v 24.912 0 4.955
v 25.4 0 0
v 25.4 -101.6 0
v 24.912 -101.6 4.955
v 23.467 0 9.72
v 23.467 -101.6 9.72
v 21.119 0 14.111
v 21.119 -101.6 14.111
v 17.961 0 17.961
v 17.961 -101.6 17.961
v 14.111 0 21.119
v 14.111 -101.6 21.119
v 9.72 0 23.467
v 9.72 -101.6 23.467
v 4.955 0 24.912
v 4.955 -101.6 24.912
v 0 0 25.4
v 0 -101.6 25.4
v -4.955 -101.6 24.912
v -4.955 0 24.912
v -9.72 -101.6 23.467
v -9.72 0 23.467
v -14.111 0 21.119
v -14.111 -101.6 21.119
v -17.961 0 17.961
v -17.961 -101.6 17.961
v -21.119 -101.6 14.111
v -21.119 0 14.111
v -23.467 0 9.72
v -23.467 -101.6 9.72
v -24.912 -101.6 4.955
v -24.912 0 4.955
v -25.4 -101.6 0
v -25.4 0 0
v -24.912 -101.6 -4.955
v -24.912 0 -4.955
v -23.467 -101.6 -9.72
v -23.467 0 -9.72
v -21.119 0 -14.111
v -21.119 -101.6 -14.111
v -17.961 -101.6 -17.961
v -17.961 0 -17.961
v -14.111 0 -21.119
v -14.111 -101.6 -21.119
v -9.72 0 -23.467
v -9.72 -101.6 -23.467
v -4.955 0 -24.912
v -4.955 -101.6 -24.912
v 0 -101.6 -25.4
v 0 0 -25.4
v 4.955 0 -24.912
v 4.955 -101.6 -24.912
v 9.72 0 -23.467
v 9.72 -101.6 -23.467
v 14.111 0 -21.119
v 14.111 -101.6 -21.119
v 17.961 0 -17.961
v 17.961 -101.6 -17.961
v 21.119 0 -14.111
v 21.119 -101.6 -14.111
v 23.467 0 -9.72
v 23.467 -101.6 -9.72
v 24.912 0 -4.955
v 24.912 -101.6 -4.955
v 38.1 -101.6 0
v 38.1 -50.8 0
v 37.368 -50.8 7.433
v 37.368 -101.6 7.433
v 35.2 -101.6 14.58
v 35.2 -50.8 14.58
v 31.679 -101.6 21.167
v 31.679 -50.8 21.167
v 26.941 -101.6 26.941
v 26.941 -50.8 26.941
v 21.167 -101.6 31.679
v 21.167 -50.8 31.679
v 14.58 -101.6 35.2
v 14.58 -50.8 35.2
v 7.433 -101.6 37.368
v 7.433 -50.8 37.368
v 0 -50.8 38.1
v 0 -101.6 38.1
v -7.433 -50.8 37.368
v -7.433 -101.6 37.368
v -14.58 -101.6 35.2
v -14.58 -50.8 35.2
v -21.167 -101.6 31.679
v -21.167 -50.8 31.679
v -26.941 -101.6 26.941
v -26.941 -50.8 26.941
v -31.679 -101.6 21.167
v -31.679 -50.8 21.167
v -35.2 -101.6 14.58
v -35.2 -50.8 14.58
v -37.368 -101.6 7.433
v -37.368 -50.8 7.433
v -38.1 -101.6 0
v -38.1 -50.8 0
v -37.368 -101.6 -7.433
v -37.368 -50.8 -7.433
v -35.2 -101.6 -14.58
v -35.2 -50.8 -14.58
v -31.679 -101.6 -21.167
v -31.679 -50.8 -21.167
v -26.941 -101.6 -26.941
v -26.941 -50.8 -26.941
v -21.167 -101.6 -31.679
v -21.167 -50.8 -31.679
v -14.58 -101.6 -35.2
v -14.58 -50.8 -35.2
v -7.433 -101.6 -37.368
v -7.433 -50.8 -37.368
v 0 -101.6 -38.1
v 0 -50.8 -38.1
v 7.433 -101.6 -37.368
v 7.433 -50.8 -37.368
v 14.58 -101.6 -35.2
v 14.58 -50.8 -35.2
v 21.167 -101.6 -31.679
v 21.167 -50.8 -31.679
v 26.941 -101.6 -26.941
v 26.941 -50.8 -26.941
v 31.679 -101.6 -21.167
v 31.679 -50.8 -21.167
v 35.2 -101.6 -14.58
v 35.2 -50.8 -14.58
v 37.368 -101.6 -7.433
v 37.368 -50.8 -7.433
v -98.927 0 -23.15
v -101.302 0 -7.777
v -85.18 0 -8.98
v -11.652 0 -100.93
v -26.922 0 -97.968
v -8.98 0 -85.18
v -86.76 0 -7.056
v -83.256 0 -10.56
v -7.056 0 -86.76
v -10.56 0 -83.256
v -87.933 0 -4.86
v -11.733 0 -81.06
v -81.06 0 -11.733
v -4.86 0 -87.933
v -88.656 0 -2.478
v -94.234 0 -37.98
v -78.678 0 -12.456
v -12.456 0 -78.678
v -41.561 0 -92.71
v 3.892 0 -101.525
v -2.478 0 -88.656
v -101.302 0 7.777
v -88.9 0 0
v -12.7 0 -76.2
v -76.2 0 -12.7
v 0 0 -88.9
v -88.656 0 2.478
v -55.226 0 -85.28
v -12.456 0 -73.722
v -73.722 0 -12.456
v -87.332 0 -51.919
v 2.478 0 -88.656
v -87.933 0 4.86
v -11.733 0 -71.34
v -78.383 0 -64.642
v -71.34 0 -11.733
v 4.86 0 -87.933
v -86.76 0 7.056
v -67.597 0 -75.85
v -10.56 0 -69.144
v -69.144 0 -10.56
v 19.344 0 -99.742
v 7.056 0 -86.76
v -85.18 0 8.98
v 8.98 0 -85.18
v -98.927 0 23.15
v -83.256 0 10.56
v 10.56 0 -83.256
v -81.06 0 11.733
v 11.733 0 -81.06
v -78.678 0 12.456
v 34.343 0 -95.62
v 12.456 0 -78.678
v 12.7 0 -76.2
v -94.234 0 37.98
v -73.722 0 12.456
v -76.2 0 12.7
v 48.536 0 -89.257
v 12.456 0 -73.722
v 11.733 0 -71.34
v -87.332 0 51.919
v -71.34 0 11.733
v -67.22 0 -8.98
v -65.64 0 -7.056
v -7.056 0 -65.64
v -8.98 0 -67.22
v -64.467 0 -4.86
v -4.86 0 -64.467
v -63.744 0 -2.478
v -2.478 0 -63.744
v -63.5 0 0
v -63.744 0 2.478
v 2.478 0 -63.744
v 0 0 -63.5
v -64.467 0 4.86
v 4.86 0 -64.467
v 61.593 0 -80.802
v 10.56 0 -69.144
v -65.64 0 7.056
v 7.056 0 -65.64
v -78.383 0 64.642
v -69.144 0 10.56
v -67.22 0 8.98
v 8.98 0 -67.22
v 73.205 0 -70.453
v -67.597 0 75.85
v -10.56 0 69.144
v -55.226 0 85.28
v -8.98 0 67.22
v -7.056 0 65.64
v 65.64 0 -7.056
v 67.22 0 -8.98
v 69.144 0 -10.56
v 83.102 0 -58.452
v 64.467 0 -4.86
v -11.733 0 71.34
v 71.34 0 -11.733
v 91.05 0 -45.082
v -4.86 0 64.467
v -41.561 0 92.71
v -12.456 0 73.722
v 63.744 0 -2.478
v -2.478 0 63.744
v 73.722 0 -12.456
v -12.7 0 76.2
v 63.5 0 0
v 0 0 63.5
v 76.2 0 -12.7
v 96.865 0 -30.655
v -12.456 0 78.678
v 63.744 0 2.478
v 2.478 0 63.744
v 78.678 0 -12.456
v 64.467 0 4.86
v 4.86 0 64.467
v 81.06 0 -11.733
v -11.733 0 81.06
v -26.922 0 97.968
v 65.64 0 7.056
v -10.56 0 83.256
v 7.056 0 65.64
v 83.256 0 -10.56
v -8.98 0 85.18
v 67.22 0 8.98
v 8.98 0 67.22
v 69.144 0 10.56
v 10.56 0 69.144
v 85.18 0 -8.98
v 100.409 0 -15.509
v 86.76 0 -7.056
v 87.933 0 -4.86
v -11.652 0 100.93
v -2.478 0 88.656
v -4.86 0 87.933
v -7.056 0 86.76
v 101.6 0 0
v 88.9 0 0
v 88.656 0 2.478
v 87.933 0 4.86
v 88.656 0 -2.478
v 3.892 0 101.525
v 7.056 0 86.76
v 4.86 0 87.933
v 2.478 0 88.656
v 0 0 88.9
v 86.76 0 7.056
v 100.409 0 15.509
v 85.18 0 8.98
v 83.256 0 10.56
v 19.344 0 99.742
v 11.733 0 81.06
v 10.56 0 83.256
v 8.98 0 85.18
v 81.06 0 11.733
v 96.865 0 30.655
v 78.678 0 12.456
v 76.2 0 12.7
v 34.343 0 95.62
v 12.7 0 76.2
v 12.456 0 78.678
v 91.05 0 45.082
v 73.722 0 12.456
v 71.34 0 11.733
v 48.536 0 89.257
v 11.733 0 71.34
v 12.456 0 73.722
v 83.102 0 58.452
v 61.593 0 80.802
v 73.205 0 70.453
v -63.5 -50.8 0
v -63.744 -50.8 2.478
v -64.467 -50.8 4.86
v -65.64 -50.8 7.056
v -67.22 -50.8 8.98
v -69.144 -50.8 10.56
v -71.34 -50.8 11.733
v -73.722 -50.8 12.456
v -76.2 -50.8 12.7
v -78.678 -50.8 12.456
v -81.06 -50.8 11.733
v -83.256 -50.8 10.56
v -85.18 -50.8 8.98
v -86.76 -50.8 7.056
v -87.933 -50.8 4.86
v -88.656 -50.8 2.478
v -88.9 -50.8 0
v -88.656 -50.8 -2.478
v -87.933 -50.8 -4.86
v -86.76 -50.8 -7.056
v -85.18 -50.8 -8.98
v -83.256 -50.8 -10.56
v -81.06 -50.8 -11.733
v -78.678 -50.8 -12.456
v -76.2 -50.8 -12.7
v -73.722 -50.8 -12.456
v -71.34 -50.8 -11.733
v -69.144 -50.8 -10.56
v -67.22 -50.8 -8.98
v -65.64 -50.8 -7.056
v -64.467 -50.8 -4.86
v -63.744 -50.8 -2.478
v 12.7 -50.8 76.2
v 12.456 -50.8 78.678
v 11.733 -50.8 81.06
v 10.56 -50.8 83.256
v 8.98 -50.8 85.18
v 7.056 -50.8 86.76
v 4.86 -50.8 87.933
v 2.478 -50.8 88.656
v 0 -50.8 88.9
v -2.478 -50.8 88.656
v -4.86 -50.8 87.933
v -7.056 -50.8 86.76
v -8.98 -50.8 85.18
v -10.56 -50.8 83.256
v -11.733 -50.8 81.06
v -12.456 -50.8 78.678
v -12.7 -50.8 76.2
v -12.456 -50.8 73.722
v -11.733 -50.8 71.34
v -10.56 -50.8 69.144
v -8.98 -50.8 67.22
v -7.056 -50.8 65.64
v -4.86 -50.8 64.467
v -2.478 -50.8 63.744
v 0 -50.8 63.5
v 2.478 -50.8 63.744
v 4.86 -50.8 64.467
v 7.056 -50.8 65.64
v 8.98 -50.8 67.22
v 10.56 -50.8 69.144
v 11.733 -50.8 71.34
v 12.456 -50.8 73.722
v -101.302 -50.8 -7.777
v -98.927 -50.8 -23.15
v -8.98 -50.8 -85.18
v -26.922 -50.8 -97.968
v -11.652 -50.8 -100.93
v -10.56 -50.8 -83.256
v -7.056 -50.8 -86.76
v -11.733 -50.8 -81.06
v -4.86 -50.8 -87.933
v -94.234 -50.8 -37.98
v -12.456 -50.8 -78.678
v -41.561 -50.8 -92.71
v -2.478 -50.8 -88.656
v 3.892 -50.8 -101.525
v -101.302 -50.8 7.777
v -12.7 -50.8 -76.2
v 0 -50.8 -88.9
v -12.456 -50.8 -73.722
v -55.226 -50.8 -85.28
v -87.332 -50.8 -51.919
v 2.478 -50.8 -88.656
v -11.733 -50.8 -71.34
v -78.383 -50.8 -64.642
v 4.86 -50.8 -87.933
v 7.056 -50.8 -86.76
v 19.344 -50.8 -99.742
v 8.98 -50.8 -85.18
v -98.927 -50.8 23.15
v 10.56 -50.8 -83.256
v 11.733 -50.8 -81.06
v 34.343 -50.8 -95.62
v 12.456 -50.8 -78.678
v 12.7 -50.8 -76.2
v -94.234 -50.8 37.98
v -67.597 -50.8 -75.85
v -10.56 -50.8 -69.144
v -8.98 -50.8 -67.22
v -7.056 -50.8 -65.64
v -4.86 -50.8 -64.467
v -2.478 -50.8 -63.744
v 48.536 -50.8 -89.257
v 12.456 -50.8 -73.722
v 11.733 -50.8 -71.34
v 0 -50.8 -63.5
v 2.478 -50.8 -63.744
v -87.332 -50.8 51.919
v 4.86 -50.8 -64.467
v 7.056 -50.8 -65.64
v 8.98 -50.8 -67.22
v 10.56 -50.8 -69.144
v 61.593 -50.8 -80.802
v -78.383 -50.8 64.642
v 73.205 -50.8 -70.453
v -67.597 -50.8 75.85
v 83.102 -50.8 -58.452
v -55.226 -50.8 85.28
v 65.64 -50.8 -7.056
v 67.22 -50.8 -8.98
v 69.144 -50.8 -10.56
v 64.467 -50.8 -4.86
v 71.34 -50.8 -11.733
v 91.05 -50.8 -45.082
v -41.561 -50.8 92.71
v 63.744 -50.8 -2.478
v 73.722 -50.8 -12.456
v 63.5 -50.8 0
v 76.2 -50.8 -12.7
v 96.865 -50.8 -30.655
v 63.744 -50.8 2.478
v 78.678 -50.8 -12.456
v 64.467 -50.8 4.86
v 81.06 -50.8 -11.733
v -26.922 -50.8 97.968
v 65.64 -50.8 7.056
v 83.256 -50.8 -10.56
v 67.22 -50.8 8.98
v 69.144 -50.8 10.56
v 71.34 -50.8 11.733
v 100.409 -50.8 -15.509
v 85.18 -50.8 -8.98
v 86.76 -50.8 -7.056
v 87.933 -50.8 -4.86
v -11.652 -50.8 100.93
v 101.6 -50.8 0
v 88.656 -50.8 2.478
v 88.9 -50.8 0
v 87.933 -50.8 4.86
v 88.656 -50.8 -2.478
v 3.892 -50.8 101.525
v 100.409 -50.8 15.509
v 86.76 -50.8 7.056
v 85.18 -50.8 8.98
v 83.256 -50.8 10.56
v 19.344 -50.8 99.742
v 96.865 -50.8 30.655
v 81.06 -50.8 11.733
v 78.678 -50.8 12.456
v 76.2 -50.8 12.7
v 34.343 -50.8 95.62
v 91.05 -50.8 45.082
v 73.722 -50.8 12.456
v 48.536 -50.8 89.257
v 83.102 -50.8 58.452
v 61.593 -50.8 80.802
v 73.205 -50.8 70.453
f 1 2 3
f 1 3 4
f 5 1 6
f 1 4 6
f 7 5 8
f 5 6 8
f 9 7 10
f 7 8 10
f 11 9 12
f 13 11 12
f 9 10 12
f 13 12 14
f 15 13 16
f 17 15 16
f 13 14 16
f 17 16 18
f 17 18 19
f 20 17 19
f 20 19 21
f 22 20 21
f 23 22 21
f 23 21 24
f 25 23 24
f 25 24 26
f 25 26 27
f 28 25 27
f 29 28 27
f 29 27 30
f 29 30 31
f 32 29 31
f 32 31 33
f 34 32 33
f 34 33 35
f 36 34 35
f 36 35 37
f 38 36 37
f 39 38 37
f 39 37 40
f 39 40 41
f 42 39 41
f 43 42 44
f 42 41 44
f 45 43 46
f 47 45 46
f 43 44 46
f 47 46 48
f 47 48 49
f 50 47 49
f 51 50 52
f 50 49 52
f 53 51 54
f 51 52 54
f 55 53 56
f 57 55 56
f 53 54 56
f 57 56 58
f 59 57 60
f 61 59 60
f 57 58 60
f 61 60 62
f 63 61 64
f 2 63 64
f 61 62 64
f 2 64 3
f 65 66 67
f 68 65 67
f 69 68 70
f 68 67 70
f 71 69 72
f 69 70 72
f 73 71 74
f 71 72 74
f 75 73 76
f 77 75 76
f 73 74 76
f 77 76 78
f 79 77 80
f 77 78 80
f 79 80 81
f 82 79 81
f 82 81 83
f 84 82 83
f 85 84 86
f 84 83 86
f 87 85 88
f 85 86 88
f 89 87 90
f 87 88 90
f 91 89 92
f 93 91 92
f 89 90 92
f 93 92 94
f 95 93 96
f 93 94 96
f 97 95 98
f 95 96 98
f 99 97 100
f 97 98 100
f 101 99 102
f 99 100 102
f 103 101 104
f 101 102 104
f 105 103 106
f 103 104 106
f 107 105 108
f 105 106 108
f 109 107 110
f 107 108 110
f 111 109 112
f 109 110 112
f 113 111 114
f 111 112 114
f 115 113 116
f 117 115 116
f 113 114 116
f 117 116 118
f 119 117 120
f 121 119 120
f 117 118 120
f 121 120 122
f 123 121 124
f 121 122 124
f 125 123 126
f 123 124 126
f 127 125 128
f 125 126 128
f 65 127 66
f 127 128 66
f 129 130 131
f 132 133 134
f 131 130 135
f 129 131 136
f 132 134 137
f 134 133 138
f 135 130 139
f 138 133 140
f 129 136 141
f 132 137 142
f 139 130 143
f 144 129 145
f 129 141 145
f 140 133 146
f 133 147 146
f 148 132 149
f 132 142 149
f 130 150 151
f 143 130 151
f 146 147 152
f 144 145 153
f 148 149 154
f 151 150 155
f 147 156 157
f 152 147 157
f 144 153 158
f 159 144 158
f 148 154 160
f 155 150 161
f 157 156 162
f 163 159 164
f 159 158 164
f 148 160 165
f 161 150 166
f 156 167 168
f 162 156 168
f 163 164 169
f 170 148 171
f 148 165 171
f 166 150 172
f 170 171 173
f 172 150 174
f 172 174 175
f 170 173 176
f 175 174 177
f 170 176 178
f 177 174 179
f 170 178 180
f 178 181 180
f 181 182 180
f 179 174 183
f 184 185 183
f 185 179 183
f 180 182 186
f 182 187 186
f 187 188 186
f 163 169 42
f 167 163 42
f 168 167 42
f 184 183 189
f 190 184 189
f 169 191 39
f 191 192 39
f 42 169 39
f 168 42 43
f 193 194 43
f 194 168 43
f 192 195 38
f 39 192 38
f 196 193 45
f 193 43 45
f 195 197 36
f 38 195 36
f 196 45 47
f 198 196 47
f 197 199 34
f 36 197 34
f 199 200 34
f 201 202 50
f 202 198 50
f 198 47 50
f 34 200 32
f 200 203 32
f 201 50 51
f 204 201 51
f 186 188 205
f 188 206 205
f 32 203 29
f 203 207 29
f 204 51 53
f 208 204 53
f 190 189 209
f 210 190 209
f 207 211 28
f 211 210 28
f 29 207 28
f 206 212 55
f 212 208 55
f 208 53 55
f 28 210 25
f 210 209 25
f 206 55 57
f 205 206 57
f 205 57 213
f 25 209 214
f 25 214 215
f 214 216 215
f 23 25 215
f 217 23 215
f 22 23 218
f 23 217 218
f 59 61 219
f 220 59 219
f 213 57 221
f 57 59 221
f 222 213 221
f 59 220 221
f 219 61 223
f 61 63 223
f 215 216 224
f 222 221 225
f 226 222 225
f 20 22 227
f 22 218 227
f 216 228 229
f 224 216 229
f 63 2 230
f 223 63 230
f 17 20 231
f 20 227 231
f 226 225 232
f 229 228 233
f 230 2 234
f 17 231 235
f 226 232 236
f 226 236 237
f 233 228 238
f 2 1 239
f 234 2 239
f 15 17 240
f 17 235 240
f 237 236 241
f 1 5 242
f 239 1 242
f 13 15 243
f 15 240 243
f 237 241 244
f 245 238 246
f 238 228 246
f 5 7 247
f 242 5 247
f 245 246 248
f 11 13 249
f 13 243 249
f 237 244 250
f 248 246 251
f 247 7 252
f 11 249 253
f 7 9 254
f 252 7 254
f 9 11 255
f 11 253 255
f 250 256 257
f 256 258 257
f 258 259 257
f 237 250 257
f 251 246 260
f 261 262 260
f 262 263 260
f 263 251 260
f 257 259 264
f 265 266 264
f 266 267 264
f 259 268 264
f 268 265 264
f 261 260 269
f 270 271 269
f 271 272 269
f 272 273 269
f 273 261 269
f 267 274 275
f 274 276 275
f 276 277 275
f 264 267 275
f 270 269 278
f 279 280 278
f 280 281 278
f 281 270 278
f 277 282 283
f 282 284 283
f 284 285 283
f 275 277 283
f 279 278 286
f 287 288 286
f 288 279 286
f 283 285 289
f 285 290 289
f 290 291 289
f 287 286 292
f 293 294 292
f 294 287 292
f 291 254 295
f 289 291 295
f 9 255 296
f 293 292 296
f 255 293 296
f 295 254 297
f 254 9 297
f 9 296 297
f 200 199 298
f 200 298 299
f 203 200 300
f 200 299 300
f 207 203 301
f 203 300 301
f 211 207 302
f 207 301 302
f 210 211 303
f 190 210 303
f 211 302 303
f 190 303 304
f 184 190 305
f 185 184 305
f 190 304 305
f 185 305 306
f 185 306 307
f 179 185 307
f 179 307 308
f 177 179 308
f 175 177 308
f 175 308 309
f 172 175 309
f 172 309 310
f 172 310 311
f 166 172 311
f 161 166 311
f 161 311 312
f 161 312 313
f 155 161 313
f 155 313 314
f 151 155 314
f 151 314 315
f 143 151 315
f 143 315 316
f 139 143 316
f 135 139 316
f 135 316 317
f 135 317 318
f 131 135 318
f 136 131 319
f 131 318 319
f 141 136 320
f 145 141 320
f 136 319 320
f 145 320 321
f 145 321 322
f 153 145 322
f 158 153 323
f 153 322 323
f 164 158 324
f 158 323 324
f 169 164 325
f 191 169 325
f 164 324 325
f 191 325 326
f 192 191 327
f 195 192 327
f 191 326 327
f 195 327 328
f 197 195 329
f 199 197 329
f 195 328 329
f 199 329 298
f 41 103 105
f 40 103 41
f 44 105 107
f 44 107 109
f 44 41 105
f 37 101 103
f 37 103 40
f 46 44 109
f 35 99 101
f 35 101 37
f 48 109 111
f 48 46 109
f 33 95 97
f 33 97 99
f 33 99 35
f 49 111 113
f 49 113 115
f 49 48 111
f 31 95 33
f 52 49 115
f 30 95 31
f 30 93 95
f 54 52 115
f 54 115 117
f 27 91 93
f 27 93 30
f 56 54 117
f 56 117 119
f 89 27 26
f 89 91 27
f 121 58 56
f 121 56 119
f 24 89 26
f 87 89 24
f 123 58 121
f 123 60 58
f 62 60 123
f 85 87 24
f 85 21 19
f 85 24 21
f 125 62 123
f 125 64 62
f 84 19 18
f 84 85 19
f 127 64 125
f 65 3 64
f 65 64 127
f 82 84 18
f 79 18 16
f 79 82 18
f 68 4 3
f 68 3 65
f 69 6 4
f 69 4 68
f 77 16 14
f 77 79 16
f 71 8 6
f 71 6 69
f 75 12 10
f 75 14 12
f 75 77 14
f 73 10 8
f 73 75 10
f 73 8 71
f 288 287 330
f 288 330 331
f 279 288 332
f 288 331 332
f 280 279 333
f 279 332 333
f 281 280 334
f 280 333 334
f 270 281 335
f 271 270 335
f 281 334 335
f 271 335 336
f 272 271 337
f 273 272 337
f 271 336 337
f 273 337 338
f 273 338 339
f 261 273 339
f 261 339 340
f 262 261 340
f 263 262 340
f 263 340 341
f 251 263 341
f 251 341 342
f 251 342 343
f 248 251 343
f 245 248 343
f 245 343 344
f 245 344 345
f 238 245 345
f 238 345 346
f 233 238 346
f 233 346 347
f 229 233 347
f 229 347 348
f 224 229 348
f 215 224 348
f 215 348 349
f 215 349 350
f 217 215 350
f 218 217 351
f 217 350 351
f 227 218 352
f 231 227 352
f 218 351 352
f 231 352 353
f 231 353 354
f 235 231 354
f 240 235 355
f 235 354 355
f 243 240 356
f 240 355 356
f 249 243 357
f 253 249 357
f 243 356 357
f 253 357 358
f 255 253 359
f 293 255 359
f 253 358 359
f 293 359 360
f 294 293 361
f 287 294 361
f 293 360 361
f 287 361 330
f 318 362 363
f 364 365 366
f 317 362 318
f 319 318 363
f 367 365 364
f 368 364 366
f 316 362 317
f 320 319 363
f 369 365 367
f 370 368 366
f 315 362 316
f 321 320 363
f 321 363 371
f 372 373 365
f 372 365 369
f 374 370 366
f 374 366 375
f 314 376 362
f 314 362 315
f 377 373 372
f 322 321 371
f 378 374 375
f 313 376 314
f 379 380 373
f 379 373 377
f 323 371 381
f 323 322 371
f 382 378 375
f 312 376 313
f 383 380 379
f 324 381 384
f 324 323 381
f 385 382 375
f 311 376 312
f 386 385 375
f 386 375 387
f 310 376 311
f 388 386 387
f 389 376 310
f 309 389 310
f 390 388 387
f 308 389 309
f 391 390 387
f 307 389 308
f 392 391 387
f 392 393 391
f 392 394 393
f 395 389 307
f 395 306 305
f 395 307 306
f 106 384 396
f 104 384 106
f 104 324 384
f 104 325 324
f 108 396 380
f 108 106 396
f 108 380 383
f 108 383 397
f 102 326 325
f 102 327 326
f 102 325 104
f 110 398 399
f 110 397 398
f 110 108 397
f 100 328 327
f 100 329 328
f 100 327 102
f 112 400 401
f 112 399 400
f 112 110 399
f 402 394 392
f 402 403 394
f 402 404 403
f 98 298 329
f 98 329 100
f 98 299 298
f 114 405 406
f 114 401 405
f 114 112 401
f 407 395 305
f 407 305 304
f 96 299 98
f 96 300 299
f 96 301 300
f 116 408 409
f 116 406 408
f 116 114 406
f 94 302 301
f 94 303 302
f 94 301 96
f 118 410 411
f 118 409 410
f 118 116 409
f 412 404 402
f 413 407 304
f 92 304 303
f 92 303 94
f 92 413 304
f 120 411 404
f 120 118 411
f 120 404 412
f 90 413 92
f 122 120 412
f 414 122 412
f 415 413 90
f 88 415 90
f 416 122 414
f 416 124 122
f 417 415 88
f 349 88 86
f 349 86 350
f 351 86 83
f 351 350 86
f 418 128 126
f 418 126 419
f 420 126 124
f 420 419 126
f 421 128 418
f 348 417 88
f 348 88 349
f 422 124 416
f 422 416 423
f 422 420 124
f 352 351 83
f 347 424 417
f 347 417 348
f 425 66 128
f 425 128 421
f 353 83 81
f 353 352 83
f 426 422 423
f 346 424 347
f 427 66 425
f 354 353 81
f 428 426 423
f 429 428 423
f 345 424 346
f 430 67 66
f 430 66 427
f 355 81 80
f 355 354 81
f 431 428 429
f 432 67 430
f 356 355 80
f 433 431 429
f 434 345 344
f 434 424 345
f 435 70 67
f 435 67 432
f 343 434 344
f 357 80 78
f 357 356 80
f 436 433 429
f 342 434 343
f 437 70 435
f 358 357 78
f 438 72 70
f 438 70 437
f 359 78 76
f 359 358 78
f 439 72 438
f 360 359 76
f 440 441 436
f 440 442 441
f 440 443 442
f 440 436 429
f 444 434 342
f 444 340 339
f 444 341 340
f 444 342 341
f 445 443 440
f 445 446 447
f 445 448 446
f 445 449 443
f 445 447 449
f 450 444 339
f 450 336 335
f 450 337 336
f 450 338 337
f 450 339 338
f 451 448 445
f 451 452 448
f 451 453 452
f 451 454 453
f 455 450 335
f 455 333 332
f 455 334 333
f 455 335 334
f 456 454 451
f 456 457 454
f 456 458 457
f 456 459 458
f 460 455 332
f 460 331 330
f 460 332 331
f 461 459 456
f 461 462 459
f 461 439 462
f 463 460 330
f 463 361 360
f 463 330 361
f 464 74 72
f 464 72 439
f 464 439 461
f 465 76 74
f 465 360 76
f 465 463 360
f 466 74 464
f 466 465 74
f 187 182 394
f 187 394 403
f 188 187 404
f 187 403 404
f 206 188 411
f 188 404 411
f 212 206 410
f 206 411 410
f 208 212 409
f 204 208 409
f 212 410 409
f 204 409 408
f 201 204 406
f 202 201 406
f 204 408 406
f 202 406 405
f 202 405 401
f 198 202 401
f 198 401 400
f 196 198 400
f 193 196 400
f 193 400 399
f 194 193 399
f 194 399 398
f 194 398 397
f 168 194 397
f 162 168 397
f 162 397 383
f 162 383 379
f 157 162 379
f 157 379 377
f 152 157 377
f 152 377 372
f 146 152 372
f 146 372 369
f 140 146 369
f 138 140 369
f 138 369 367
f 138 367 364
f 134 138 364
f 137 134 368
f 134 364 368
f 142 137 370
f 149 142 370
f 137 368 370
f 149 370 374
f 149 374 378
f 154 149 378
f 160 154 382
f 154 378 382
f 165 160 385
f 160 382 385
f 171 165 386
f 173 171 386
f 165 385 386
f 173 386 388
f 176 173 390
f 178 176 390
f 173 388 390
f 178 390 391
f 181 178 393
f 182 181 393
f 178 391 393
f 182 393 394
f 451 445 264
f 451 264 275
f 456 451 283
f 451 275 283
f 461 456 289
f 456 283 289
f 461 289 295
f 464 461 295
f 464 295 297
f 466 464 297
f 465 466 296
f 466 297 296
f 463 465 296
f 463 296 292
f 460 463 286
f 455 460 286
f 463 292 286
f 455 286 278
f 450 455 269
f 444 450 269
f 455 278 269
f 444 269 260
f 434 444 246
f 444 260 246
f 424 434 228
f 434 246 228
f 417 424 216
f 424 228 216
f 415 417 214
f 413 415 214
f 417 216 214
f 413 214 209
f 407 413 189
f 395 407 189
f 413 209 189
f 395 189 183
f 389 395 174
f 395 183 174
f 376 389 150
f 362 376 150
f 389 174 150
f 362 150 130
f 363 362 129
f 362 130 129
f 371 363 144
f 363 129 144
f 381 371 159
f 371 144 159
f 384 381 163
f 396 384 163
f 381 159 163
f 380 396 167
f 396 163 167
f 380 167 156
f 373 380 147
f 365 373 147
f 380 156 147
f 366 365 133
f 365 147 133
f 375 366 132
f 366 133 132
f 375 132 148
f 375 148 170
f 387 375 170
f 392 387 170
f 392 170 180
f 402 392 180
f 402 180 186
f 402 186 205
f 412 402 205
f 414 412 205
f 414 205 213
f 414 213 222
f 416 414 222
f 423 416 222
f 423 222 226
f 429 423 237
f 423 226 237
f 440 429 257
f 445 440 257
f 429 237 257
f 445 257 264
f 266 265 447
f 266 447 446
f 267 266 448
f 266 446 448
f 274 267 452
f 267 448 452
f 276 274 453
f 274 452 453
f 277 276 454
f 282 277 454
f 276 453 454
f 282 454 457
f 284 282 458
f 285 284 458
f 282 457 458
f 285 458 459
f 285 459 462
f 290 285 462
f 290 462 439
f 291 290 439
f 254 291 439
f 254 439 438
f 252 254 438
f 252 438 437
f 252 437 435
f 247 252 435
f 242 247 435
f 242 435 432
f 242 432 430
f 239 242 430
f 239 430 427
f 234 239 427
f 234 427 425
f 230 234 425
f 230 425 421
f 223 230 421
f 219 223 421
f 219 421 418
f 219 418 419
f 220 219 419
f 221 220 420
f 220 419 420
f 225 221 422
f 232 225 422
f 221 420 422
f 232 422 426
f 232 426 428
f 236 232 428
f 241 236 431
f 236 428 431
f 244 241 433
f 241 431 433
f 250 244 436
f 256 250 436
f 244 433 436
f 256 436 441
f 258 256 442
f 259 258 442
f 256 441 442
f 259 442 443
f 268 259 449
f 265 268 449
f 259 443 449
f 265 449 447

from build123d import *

# Parameters (mm, degrees)
F0_R     = 101.6
F1_DEPTH = 50.8
F2_R     = 38.1
F3_DEPTH = 50.8
F4_R     = 25.4
F5_DEPTH = 148.082
F6_R     = 12.7
F7_DEPTH = 95.758


with BuildPart() as f1:
    # F0 (on Front) → F1 (new body)
    with BuildSketch(Plane.XZ):
        Circle(F0_R)
    extrude(amount=F1_DEPTH)

    # F2 (on face) → F3 (join)
    with BuildSketch(Plane.XZ.offset(50.8)):
        Circle(F2_R)
    extrude(amount=F3_DEPTH)

    # F4 (on face) → F5 (cut)
    with BuildSketch(Plane.XZ.offset(101.6)):
        Circle(F4_R)
    extrude(amount=-F5_DEPTH, mode=Mode.SUBTRACT)

    # F6 (on face) → F7 (cut)
    with BuildSketch(Plane.XZ.offset(50.8)):
        with Locations((0, 76.2)):
            Circle(F6_R)
        with Locations((76.2, 0)):
            Circle(F6_R)
        with Locations((0, -76.2)):
            Circle(F6_R)
        with Locations((-76.2, 0)):
            Circle(F6_R)
    extrude(amount=-F7_DEPTH, mode=Mode.SUBTRACT)


solid = f1.part
